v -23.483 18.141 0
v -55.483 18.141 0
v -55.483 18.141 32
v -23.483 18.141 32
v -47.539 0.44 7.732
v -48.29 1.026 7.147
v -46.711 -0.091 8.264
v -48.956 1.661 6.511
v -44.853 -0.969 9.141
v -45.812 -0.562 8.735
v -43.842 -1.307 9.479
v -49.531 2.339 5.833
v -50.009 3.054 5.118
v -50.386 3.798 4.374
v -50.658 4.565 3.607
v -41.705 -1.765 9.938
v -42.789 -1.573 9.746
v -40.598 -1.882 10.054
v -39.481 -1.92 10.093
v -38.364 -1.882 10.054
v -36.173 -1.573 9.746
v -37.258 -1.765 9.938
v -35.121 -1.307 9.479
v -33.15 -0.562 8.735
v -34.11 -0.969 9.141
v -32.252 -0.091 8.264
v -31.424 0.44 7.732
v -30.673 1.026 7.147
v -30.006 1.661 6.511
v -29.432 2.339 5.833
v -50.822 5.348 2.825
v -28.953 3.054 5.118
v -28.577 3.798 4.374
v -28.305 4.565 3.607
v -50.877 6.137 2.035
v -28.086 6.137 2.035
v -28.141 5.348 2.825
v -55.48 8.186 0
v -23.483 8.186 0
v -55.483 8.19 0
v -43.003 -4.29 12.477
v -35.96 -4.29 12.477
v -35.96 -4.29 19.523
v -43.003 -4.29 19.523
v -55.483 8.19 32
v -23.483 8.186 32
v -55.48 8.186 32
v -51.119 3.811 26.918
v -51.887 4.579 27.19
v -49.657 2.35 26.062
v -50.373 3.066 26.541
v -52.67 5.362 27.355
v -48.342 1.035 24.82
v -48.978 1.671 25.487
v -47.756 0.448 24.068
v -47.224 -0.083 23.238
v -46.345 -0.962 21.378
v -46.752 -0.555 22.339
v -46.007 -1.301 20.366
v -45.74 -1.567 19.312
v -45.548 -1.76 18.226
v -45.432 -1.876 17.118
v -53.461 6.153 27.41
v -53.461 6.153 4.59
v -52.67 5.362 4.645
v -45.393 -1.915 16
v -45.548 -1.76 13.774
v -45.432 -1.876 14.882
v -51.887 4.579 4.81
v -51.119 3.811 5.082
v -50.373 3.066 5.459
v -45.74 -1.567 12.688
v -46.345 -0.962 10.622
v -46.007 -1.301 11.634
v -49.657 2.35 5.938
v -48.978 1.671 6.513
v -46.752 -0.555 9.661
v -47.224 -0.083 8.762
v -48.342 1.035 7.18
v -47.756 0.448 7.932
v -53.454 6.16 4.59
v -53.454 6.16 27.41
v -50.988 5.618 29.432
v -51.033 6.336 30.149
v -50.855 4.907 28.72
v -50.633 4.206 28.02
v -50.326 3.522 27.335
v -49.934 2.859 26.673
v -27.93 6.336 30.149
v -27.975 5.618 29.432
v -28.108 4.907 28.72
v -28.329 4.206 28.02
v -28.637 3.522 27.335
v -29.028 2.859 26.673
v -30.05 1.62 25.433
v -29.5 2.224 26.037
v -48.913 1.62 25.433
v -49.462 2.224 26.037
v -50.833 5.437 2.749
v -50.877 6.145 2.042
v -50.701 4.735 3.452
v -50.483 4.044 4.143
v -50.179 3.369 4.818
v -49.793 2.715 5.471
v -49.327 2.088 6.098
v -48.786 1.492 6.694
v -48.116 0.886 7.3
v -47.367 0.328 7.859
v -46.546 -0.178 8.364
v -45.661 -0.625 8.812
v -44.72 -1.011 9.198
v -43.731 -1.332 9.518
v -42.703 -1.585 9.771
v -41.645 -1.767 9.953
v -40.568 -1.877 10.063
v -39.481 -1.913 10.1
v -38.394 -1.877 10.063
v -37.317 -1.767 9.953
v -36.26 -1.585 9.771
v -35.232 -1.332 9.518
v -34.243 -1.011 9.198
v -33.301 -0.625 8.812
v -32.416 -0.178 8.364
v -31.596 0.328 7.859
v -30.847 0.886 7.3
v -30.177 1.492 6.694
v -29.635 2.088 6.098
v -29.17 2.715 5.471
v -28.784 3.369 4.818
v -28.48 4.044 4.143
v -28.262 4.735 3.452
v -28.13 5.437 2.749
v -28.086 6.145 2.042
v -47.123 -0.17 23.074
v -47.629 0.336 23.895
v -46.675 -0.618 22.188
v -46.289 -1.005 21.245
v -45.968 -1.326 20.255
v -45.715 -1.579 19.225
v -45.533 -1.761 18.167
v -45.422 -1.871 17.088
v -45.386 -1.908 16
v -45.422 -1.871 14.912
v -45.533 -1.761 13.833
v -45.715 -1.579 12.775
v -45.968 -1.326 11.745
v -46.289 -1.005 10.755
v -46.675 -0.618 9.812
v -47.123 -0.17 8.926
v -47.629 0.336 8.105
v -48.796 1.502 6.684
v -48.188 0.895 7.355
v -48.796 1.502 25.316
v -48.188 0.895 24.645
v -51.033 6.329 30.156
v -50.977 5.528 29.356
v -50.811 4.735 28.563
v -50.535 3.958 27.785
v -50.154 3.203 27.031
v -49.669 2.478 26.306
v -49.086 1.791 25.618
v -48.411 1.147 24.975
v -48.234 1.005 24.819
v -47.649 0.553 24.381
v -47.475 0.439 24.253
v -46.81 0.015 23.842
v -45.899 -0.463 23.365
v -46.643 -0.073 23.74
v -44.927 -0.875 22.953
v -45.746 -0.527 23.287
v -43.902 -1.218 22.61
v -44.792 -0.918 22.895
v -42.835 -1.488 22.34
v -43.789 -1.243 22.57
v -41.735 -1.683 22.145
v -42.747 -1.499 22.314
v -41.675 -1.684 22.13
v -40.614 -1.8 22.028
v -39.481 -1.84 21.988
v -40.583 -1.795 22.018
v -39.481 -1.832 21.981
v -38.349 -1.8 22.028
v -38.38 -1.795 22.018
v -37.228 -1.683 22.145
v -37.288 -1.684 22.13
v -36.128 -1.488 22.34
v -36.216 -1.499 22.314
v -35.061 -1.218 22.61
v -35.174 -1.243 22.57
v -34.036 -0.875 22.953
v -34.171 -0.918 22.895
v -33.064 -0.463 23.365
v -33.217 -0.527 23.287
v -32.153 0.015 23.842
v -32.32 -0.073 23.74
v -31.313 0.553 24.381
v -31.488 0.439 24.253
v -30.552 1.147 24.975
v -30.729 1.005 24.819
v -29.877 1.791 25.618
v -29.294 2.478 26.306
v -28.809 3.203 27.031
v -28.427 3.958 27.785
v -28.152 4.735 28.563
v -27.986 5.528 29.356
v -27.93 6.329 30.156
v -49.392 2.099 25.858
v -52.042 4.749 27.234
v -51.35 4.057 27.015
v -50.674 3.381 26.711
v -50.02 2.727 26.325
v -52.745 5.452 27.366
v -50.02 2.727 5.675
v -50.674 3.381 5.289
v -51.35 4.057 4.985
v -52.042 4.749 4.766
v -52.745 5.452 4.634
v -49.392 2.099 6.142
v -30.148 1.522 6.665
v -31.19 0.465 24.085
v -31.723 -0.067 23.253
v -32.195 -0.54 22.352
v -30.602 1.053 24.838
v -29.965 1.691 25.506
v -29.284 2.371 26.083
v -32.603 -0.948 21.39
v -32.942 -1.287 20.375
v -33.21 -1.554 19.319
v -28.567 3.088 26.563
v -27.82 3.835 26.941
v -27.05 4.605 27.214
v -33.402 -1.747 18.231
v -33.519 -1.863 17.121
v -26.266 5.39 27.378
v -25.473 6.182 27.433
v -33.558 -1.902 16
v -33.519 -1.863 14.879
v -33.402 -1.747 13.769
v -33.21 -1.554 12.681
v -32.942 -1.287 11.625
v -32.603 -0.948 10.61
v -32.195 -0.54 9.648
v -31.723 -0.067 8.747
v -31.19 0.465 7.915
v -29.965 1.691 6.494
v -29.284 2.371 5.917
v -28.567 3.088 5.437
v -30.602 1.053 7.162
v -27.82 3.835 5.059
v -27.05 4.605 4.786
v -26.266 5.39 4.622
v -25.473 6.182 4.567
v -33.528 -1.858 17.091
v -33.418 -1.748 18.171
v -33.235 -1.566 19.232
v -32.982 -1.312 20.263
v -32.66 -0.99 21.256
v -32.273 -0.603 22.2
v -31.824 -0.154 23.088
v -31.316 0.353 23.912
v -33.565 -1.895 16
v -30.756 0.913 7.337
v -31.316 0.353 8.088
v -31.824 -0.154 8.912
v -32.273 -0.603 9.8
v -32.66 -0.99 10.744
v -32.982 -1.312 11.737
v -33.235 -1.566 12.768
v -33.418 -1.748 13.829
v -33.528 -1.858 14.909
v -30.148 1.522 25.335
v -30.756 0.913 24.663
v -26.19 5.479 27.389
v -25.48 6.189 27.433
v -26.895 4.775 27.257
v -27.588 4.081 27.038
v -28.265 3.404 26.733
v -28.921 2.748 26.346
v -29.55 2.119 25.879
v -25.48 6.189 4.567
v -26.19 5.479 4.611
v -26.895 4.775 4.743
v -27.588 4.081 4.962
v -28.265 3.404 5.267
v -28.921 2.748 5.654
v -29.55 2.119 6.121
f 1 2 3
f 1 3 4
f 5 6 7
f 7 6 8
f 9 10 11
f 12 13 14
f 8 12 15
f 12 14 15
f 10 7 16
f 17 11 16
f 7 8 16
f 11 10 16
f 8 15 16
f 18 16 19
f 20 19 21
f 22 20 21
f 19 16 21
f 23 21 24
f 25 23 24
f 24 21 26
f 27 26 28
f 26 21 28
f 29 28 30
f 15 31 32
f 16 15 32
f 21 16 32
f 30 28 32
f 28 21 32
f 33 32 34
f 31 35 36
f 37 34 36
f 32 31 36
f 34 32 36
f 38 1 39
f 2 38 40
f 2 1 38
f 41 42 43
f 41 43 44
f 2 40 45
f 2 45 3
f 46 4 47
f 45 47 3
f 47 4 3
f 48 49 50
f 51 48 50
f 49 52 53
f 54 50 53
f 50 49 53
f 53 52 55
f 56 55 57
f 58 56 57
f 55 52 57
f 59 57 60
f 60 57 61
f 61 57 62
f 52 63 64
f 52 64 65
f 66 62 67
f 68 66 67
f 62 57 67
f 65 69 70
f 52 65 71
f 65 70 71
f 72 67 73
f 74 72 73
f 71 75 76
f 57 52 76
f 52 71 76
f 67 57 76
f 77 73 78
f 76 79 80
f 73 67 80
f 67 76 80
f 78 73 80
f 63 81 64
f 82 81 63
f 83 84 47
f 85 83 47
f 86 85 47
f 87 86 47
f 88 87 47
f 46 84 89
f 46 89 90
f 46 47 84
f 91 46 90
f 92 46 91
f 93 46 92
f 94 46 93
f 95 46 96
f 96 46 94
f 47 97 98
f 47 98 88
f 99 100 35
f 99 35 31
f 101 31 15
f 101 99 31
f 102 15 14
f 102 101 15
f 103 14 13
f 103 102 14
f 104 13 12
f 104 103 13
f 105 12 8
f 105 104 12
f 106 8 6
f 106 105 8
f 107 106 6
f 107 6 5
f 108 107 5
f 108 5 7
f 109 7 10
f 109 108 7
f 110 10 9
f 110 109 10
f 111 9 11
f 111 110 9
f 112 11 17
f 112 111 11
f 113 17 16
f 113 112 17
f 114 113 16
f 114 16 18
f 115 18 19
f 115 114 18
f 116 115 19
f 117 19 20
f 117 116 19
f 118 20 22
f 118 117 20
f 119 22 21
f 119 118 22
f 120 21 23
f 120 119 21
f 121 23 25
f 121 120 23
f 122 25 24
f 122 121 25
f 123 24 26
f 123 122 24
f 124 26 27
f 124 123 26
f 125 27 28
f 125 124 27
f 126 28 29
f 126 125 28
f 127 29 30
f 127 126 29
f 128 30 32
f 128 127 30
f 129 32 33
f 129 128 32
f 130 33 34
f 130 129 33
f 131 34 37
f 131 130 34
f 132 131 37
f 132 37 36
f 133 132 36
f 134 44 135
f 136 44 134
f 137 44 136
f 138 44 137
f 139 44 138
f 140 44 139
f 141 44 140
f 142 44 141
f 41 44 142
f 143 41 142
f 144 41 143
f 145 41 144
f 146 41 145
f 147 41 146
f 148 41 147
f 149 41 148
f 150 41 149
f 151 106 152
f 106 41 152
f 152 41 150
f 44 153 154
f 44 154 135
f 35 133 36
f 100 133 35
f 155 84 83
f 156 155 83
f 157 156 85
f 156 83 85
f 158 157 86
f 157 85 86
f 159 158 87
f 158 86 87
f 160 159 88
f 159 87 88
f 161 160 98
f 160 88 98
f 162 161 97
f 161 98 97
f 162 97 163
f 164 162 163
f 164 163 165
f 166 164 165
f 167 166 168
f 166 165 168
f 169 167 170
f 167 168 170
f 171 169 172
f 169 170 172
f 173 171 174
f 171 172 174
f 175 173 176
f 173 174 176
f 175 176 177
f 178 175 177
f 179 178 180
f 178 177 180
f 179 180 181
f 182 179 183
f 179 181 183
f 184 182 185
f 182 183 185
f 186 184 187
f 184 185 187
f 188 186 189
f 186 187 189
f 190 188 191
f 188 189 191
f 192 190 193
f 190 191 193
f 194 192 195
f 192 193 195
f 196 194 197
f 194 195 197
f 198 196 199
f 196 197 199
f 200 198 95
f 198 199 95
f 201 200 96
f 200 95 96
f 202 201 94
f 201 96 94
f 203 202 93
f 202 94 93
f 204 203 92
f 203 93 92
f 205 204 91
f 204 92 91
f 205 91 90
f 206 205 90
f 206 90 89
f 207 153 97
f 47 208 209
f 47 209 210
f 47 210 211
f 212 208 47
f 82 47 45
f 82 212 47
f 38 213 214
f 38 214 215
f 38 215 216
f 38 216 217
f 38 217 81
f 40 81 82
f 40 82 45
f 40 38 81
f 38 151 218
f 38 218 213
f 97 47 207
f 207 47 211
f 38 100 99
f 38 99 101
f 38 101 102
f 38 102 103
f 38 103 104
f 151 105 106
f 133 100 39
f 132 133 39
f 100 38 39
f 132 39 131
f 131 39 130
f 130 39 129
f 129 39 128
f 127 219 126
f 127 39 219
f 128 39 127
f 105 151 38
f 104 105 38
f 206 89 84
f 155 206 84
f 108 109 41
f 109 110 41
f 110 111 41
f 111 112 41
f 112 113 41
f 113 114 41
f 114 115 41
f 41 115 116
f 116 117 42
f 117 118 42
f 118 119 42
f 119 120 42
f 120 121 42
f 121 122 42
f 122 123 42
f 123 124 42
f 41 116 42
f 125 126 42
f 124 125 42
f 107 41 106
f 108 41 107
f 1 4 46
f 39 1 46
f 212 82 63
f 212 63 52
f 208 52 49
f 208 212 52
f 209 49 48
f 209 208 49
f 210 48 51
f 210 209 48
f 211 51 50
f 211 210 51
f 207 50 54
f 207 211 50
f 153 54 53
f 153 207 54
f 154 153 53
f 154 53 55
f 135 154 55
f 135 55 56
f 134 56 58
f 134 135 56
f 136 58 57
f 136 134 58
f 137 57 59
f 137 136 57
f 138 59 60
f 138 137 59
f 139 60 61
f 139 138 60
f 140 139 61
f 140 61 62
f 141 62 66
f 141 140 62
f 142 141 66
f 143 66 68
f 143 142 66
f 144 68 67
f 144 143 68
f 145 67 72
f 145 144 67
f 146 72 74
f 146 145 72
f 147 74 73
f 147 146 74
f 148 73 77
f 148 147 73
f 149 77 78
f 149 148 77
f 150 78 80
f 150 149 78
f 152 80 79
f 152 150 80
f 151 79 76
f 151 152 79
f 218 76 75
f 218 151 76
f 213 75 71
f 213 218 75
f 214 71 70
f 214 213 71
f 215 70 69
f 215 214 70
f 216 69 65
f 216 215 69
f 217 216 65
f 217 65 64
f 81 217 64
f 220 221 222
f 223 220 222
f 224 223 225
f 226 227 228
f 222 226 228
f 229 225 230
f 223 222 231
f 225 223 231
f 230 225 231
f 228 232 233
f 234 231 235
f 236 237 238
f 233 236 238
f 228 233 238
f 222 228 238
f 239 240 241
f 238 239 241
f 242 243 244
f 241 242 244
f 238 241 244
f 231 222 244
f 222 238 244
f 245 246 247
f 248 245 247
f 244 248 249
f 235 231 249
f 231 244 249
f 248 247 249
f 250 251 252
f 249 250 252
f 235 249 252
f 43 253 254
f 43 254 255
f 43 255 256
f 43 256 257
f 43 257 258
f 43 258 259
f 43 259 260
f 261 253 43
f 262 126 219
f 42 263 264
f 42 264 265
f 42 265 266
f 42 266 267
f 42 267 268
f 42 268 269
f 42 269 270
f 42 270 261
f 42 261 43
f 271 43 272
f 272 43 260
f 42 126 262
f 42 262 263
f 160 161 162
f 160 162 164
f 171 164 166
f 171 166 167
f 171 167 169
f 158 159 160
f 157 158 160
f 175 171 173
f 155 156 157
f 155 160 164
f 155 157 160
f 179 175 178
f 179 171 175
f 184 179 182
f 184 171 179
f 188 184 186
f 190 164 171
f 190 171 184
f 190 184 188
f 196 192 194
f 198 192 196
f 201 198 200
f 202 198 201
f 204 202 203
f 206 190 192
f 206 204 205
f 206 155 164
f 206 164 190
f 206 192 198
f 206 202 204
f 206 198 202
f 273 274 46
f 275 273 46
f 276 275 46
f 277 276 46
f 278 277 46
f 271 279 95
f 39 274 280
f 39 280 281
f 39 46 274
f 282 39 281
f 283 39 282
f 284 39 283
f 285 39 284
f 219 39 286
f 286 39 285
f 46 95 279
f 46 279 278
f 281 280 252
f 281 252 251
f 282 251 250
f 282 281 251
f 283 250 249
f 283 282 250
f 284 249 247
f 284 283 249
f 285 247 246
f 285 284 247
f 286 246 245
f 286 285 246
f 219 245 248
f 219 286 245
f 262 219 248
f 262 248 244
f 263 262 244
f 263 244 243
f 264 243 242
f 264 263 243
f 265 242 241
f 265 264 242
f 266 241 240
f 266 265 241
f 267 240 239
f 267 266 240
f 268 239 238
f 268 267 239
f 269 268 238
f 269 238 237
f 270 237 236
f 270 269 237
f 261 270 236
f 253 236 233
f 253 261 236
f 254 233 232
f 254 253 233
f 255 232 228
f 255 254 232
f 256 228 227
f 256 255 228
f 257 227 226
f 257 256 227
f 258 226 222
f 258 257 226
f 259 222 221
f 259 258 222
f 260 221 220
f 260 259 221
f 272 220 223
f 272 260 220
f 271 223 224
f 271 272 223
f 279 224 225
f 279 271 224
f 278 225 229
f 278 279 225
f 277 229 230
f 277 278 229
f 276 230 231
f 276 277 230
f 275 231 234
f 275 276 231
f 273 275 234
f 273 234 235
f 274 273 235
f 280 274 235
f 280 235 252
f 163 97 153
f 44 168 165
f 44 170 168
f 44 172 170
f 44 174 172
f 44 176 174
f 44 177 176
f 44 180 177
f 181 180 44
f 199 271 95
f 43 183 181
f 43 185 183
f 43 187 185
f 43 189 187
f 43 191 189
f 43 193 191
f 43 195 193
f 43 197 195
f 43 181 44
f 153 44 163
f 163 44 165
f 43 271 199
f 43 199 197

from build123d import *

# Parameters (mm, degrees)
SALIENTE_EXTRUIR1_DEPTH = 32
CORTAR_EXTRUIR2_DEPTH   = 33
SALIENTE_EXTRUIR2_DEPTH = 0.01
SALIENTE_EXTRUIR3_DEPTH = 0.01
SALIENTE_EXTRUIR5_DEPTH = 0.01
SALIENTE_EXTRUIR6_DEPTH = 0.01


with BuildPart() as part:
    # Croquis1 → Saliente-Extruir1 (new body)
    with BuildSketch(Plane.XY):
        Polygon((-23.483096056, 8.186360271), (-55.483096056, 8.189793686), (-55.483096056, 18.141275036), (-23.483096056, 18.141275036), align=None)
        Polygon((-23.483096056, 8.186360271), (-35.959662641, -4.290206314), (-43.003096056, -4.290206314), (-55.483096056, 8.189793686), align=None)
    extrude(amount=SALIENTE_EXTRUIR1_DEPTH)

    # Croquis2 → Cortar-Extruir2 (cut)
    with BuildSketch(Plane(origin=(-23.483096056, 0, 0), x_dir=(0, 0, -1), z_dir=(1, 0, 0))):
        Polygon((-12.476566586, -4.290206314), (0, -4.290206314), (0, 8.186360271), align=None)
        Polygon((-32, -4.290206314), (-32, 8.186360271), (-19.523433414, -4.290206314), align=None)
    extrude(amount=-CORTAR_EXTRUIR2_DEPTH, mode=Mode.SUBTRACT)

    # Croquis3 → Saliente-Extruir2 (add)
    with BuildSketch(Plane(origin=(0, 4.093180136, 4.093180136), x_dir=(-1, 0, 0), z_dir=(0, -0.707106781, -0.707106781))):
        with BuildLine():
            Line((28.08600417, 2.901010434), (50.876754527, 2.901010434))
            ThreePointArc((50.876754527, 2.901010434), (39.481379348, -8.494364744), (28.08600417, 2.901010434))
        make_face()
    extrude(amount=SALIENTE_EXTRUIR2_DEPTH)

    # Croquis4 → Saliente-Extruir3 (add)
    with BuildSketch(Plane(origin=(-15.834728163, 15.834728163, 0), x_dir=(-0.707106781, -0.707106781, 0), z_dir=(0.707106781, -0.707106781, 0))):
        with BuildLine():
            Line((13.640847296, -27.43326467), (13.640847296, -4.56673533))
            ThreePointArc((13.640847296, -4.56673533), (25.074111966, -16), (13.640847296, -27.43326467))
        make_face()
    extrude(amount=SALIENTE_EXTRUIR3_DEPTH)

    # Croquis5 → Saliente-Extruir5 (add)
    with BuildSketch(Plane(origin=(0, -11.906819864, 11.906819864), x_dir=(1, 0, 0), z_dir=(0, -0.707106781, 0.707106781))):
        with BuildLine():
            Line((-27.929927847, 25.798759553), (-39.481379348, 25.798759553))
            Line((-39.481379348, 25.798759553), (-51.03283085, 25.798759553))
            ThreePointArc((-51.03283085, 25.798759553), (-39.481379348, 14.247308052), (-27.929927847, 25.798759553))
        make_face()
    extrude(amount=SALIENTE_EXTRUIR5_DEPTH)

    # Croquis6 → Saliente-Extruir6 (add)
    with BuildSketch(Plane(origin=(-23.646651185, -23.646651185, 0), x_dir=(-0.707106781, 0.707106781, 0), z_dir=(-0.707106781, -0.707106781, 0))):
        with BuildLine():
            Line((42.153256878, -4.590405514), (42.153256878, -27.409594486))
            ThreePointArc((42.153256878, -27.409594486), (30.743662392, -16), (42.153256878, -4.590405514))
        make_face()
    extrude(amount=SALIENTE_EXTRUIR6_DEPTH)


solid = part.part
